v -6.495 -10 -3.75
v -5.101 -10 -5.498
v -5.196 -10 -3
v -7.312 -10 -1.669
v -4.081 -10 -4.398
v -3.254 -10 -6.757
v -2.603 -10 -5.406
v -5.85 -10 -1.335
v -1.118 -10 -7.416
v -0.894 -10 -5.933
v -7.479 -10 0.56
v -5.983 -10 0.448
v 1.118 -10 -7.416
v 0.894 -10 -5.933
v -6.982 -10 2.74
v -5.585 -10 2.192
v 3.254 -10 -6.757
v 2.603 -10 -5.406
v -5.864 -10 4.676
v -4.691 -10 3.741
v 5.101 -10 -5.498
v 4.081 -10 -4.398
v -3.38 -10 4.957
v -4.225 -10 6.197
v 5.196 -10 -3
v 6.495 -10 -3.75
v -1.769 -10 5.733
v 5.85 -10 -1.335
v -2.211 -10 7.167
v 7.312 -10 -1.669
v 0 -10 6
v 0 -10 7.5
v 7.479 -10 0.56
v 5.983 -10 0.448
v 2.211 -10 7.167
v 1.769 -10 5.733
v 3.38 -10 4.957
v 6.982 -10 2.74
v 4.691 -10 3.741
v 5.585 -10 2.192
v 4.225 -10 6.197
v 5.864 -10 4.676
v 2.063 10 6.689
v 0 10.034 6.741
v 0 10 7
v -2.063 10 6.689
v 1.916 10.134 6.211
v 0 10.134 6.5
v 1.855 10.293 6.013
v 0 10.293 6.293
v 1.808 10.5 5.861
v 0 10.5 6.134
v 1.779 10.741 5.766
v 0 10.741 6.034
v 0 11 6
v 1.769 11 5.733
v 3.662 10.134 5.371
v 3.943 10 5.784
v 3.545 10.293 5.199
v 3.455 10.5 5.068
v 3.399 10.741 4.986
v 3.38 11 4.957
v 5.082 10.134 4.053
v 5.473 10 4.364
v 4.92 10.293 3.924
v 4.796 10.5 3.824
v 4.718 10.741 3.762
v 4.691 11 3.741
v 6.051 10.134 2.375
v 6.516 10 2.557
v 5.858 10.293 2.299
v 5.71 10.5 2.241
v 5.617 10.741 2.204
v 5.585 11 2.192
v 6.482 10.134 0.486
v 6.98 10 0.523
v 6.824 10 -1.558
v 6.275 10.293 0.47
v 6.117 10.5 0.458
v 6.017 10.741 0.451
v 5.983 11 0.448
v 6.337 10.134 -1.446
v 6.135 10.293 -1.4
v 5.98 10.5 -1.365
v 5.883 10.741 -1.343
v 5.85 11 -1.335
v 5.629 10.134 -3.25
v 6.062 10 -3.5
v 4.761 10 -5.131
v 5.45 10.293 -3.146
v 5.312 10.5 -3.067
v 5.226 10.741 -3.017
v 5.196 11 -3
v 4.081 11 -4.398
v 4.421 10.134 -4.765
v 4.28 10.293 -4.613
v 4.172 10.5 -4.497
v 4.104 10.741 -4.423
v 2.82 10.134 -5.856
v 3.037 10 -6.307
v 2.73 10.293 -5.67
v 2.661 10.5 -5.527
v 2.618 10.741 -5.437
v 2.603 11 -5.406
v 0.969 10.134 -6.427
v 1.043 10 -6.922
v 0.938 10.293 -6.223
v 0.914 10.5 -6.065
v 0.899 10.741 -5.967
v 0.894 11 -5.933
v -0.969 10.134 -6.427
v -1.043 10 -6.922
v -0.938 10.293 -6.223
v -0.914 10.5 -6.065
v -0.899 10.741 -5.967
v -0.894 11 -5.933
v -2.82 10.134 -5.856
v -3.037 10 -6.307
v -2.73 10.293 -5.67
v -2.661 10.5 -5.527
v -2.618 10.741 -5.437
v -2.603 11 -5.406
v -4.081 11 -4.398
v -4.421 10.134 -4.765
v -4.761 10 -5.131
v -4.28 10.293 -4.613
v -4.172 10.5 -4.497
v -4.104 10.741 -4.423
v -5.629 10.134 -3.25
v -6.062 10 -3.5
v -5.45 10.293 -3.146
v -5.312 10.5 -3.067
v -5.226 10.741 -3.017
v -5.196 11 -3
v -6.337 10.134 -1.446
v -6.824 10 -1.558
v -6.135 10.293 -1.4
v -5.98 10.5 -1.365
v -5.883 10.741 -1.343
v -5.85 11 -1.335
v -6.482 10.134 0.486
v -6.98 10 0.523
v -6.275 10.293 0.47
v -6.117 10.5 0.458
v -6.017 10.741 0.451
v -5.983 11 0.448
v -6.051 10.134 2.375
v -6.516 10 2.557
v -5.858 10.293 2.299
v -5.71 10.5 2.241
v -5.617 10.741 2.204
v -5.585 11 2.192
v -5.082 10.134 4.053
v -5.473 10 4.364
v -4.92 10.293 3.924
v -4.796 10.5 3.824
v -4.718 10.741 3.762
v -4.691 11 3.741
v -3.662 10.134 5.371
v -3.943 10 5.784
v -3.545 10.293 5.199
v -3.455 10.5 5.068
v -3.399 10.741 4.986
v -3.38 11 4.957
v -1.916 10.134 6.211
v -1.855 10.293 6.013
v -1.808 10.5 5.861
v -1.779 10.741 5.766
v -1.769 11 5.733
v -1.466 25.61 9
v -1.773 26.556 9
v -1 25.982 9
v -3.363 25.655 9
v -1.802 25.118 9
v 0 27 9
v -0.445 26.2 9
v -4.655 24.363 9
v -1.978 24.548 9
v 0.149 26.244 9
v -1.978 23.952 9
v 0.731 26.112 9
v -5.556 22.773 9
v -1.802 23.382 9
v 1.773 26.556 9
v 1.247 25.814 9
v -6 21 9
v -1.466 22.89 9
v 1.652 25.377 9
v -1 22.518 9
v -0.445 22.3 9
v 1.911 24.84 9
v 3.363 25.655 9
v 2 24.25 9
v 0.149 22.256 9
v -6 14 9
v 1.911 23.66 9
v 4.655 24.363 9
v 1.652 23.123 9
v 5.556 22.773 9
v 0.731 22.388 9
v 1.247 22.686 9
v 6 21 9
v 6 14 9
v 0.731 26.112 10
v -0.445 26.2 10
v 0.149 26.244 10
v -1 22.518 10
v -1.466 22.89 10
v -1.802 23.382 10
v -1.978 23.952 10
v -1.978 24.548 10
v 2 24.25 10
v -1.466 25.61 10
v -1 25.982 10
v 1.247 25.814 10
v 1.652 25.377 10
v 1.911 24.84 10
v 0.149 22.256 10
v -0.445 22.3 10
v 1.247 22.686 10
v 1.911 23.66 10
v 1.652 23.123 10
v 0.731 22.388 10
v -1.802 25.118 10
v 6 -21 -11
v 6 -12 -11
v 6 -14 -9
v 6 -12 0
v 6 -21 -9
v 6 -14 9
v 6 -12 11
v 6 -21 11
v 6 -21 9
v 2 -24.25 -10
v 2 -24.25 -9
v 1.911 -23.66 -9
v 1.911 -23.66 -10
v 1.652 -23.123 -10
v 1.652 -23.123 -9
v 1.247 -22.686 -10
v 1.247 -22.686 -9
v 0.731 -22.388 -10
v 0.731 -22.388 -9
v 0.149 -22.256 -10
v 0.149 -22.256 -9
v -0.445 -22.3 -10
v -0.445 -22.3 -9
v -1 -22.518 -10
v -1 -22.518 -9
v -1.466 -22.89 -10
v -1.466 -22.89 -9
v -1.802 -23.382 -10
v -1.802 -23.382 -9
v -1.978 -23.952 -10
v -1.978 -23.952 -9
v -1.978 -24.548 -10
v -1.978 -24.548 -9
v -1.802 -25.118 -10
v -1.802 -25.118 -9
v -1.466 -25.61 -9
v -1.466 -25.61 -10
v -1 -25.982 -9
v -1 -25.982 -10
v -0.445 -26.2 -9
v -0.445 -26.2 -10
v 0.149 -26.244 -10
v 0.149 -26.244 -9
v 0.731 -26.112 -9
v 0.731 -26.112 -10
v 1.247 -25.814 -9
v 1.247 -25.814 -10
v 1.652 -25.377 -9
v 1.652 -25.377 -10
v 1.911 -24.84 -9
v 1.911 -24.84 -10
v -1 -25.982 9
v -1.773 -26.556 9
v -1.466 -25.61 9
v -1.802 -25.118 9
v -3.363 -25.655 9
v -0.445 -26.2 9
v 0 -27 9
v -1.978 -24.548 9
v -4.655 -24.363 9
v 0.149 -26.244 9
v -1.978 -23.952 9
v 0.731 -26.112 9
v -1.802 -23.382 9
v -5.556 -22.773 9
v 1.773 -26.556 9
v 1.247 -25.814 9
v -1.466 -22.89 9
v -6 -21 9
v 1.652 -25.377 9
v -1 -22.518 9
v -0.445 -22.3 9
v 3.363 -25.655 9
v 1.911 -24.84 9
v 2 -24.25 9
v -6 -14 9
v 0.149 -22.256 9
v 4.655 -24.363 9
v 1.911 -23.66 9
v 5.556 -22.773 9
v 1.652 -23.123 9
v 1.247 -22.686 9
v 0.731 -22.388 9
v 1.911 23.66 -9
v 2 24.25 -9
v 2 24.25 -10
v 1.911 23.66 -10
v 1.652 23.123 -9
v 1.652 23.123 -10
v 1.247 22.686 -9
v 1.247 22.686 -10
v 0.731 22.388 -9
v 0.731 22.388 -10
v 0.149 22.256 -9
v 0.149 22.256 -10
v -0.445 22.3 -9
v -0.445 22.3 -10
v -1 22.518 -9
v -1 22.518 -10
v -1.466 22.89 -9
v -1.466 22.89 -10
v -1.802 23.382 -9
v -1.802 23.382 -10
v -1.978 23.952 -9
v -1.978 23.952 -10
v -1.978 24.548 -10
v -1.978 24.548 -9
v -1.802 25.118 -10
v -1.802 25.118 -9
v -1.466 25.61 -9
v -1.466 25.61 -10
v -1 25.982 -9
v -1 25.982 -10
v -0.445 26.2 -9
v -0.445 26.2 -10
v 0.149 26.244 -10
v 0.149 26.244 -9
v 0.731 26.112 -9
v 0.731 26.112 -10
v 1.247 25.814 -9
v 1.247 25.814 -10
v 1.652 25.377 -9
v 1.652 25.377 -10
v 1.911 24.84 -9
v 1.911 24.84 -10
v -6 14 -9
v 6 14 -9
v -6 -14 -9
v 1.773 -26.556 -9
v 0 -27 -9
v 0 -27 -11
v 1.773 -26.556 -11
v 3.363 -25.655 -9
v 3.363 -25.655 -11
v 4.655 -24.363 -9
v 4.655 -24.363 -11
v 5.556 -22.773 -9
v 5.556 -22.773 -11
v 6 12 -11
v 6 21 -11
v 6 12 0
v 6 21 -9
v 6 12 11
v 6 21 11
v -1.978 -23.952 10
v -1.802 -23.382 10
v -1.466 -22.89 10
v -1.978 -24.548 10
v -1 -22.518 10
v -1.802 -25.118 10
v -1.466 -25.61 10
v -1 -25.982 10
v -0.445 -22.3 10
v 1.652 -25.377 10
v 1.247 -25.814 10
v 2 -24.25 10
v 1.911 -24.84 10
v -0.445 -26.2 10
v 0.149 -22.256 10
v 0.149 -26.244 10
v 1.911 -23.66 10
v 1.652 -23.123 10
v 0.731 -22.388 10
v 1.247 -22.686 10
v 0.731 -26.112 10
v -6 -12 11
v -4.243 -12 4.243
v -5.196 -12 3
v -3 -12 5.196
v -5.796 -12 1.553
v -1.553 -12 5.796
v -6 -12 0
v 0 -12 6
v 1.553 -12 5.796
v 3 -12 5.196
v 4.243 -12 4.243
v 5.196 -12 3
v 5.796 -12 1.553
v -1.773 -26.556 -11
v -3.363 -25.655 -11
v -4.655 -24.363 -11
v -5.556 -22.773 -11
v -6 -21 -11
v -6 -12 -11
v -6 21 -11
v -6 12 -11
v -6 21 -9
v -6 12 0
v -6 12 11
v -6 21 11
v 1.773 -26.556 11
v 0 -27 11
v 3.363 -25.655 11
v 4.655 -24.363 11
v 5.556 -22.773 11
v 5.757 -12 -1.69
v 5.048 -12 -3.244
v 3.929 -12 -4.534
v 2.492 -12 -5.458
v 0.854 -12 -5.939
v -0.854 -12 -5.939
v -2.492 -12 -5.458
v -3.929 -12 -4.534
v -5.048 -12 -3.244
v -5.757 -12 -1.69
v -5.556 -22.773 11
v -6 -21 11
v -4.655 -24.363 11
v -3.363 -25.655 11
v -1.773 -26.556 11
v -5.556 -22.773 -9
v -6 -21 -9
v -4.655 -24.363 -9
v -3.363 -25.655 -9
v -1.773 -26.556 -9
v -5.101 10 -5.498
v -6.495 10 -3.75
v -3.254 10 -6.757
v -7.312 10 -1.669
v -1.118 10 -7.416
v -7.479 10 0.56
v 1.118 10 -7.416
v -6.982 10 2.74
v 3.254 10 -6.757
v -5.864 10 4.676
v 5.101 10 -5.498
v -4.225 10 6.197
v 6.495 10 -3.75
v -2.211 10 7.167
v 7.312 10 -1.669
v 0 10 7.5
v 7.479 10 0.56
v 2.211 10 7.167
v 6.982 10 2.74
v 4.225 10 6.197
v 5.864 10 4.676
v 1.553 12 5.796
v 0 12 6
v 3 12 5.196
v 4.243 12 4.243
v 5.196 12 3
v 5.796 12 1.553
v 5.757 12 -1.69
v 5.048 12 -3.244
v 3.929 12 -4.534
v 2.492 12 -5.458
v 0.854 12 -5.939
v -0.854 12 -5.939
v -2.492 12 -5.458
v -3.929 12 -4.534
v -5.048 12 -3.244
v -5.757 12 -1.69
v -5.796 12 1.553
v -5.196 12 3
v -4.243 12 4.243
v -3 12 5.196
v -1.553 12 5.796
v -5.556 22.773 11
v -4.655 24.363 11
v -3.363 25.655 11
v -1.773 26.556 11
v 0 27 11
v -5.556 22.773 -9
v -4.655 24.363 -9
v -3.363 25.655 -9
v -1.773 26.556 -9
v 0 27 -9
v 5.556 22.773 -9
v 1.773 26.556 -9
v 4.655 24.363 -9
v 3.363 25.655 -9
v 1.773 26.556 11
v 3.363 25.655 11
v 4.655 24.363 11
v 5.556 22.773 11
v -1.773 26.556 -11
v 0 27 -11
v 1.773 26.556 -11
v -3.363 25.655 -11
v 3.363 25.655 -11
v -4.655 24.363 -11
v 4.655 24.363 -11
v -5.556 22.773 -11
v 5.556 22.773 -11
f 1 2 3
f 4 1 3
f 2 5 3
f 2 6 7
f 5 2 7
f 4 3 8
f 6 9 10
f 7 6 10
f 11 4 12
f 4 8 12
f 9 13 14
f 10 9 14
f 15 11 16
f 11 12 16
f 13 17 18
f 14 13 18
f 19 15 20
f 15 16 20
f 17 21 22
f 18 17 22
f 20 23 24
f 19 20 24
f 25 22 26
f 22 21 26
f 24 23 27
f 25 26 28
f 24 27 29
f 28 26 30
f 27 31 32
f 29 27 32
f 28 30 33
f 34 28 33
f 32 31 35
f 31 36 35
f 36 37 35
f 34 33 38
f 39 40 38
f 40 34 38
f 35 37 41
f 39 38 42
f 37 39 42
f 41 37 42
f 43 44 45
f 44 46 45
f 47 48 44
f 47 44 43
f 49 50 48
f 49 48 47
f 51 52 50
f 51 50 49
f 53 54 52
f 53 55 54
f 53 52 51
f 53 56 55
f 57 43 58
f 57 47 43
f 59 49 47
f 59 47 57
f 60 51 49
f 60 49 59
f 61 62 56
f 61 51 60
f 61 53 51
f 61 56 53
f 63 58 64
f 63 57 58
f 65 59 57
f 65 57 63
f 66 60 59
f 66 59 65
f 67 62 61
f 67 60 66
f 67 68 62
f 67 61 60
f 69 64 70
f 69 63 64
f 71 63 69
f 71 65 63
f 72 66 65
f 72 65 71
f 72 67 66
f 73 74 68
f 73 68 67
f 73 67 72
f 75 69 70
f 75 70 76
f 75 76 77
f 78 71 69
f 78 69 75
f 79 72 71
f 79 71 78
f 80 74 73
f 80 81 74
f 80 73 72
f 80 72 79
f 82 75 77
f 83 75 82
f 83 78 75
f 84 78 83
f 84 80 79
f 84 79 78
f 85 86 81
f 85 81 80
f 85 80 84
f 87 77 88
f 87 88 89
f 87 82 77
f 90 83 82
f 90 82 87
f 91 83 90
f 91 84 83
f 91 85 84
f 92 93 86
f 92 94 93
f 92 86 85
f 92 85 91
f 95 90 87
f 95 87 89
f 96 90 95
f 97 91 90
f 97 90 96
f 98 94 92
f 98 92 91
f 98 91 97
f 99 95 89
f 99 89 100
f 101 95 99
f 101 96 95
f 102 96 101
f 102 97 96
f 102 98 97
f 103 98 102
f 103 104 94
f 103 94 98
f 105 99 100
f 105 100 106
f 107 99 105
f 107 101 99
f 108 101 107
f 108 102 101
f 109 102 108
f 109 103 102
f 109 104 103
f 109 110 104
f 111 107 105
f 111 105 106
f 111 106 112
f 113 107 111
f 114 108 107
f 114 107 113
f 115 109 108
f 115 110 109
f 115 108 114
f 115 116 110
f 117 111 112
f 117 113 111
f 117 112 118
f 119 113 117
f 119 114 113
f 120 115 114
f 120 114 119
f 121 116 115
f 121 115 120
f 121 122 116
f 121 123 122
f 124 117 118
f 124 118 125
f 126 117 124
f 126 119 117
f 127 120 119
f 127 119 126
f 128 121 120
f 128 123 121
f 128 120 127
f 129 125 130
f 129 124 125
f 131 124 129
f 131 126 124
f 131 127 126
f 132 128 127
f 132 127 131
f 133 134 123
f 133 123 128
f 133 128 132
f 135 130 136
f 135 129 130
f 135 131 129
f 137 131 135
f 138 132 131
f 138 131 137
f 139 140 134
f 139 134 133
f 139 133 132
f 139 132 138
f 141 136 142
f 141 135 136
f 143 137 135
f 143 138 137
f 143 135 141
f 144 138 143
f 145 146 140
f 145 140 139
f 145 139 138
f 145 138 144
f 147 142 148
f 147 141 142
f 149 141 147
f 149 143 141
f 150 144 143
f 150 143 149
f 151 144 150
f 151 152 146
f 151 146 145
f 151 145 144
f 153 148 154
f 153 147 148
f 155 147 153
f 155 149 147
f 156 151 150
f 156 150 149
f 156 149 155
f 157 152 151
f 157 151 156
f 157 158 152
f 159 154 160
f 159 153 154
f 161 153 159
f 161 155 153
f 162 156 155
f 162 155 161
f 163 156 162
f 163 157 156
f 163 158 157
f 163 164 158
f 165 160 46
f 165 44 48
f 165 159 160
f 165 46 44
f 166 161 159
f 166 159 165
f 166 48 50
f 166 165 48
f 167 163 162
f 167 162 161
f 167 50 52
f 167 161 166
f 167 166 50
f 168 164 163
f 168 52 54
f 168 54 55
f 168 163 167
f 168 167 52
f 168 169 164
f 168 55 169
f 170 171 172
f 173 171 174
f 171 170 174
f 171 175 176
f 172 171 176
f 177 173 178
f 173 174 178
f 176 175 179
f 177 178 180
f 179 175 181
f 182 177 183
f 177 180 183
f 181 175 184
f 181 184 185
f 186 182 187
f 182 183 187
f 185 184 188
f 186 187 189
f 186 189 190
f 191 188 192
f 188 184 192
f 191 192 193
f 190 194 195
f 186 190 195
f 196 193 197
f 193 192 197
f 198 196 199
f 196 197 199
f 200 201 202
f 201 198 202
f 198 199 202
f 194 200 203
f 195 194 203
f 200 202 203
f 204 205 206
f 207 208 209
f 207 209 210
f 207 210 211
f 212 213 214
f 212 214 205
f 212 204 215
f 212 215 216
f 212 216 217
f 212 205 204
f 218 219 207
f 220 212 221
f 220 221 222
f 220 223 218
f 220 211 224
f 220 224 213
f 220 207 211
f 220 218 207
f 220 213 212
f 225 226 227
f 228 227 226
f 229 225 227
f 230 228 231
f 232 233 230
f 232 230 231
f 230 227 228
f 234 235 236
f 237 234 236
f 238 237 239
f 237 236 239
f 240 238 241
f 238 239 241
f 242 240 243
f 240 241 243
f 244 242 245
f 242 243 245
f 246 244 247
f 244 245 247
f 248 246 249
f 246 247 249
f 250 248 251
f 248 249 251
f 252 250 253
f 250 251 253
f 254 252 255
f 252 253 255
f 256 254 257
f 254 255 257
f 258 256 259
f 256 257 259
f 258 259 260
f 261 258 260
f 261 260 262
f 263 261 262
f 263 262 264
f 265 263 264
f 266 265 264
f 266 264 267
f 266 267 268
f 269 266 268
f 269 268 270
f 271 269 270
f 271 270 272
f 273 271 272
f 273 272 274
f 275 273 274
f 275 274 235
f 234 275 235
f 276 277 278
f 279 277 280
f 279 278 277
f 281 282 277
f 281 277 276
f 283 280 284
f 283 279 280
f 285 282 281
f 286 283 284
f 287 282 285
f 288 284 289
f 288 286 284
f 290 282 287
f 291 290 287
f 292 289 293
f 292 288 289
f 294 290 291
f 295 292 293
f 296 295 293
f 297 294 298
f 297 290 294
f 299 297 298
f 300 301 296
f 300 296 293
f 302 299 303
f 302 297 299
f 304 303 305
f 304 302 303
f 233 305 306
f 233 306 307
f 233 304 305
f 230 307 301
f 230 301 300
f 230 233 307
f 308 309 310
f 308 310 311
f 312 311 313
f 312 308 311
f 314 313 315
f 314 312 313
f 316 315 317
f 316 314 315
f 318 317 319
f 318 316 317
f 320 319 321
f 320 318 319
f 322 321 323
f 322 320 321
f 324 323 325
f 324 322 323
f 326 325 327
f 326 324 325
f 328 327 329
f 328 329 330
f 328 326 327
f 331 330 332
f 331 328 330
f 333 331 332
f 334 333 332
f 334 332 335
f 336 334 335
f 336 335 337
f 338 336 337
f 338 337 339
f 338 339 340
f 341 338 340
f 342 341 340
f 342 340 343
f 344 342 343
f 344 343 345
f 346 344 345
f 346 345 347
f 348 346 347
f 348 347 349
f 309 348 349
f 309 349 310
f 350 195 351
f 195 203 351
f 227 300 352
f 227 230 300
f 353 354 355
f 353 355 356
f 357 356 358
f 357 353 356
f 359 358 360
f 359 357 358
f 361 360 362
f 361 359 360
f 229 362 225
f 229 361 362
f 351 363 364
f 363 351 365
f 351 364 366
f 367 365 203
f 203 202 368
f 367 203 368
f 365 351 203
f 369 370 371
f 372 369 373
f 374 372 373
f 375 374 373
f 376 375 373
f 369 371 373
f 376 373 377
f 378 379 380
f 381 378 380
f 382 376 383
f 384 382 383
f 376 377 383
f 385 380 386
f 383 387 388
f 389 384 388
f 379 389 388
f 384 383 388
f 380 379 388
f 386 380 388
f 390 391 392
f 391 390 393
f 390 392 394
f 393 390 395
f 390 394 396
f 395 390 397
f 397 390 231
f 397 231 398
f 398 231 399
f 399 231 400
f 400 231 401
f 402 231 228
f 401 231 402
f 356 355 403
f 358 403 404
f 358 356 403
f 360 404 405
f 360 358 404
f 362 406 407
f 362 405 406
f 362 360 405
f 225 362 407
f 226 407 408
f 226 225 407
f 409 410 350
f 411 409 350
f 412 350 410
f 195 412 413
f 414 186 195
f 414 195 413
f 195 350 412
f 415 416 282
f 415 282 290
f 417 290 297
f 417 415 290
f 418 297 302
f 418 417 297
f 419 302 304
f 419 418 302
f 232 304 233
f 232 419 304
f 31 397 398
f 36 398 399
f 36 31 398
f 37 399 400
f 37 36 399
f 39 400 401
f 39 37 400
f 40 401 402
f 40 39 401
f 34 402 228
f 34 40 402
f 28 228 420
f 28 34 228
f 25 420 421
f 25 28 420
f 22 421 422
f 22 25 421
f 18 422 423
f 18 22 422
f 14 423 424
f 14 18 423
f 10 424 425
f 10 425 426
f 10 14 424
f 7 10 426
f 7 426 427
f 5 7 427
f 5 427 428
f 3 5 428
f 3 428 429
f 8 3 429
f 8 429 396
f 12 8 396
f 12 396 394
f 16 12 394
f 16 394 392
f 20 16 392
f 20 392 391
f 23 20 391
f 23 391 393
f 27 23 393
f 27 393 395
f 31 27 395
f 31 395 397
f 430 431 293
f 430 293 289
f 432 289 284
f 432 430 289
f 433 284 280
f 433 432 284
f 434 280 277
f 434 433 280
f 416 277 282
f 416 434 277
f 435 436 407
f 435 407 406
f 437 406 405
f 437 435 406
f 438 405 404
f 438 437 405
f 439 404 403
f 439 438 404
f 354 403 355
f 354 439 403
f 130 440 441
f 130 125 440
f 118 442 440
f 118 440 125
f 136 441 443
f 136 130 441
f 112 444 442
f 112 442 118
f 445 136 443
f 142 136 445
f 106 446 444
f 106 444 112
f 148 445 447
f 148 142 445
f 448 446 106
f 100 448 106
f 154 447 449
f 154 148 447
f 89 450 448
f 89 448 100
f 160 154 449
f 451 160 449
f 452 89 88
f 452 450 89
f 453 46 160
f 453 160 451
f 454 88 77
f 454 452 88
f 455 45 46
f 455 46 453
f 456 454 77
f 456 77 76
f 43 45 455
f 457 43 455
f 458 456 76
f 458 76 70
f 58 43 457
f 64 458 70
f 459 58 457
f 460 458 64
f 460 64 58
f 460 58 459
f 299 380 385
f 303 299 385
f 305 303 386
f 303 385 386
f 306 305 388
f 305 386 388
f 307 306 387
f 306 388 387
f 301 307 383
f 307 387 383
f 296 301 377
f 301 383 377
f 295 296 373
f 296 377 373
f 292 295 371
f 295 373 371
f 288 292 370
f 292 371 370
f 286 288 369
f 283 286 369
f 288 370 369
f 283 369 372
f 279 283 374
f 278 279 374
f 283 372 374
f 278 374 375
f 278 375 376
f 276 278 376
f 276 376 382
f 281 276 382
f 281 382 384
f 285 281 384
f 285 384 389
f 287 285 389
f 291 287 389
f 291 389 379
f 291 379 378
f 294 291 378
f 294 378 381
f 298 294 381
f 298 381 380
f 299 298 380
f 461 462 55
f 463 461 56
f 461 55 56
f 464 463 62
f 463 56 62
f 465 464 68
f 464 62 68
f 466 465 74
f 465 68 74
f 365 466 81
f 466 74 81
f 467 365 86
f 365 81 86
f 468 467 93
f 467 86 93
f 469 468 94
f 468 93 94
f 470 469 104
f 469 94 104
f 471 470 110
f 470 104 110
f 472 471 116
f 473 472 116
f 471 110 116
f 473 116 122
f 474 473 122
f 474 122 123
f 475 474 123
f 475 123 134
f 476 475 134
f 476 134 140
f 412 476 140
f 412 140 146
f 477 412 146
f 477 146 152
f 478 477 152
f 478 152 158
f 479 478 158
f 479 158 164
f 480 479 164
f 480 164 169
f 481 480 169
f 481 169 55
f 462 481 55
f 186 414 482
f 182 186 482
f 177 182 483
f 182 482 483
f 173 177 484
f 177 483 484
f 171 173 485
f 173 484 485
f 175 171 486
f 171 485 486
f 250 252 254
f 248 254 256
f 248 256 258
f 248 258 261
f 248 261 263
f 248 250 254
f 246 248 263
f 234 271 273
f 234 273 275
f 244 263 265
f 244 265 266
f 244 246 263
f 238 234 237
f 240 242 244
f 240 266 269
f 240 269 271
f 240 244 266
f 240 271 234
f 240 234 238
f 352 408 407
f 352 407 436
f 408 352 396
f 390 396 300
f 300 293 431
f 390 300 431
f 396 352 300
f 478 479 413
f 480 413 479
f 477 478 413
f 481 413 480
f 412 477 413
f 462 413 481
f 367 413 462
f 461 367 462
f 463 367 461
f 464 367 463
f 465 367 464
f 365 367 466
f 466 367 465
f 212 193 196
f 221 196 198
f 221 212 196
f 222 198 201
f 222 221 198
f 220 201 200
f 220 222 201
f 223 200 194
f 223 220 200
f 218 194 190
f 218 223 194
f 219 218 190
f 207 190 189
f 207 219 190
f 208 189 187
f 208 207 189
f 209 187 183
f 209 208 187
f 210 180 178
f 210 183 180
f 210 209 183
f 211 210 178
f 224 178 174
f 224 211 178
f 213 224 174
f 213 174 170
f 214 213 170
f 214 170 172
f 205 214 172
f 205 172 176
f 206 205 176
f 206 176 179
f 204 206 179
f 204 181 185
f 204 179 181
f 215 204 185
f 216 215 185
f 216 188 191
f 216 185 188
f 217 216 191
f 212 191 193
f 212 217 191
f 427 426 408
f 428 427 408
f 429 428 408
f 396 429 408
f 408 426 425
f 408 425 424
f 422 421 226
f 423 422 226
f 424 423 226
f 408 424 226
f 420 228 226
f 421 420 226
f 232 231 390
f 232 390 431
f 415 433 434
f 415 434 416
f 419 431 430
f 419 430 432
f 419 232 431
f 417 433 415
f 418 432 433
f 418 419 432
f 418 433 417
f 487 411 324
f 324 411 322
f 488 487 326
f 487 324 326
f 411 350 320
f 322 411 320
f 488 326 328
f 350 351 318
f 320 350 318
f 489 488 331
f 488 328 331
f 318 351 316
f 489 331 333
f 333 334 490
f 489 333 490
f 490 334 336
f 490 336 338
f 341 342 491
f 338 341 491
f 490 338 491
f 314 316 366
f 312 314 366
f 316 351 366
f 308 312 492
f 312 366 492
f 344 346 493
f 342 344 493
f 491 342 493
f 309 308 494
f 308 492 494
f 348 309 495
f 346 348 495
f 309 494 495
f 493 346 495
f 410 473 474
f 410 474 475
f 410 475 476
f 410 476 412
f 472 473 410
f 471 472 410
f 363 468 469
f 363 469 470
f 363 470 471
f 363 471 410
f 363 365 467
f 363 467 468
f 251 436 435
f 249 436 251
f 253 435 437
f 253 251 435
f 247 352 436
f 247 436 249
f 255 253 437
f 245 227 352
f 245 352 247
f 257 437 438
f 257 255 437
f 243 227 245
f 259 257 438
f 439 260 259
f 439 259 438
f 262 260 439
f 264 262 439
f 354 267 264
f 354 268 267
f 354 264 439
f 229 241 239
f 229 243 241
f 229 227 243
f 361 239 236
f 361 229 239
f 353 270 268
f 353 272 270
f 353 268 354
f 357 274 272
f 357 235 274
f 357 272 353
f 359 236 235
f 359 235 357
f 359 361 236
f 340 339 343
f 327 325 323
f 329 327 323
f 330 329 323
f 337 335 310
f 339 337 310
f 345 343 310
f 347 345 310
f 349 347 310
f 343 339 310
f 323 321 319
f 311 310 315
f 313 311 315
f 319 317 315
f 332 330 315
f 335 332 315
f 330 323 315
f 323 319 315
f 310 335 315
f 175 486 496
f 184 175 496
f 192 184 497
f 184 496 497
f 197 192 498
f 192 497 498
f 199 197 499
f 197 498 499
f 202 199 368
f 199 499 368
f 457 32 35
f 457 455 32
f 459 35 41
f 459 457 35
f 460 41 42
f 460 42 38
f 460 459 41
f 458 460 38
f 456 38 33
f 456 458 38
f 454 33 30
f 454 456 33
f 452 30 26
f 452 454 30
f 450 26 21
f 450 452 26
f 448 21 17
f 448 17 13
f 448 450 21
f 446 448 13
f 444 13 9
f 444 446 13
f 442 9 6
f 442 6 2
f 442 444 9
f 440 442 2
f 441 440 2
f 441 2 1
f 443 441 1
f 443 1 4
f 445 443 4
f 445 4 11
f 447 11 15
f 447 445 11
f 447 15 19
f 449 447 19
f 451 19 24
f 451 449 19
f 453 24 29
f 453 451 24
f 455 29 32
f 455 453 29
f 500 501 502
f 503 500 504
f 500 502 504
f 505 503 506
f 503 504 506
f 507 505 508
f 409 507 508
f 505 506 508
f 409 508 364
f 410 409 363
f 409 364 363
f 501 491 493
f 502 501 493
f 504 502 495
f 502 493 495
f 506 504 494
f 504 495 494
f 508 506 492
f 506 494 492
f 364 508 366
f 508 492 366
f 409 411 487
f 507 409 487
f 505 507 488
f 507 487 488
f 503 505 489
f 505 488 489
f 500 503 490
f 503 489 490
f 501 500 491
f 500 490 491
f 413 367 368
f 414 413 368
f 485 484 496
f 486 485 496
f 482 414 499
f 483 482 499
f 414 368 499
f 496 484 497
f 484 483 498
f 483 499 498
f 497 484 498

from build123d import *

# Parameters (mm, degrees)
SKETCH1_R           = 7.5
BOSS_EXTRUDE1_DEPTH = 10
SKETCH5_R           = 6
BOSS_EXTRUDE2_DEPTH = 2
FILLET2_R           = 1
BOSS_EXTRUDE3_DEPTH = 6
CUT_EXTRUDE4_DEPTH  = 29
CUT_EXTRUDE5_START  = -1
SKETCH10_R          = 2
CUT_EXTRUDE5_DEPTH  = 20


with BuildPart() as part:
    # Sketch1 → Boss-Extrude1 (new body)
    with BuildSketch(Plane(origin=(0, 0, 0), x_dir=(1, 0, 0), z_dir=(0, 1, 0))):
        Circle(SKETCH1_R)
    boss_extrude1 = extrude(amount=BOSS_EXTRUDE1_DEPTH)

    # Sketch5 → Boss-Extrude2 (add)
    with BuildSketch(Plane(origin=(0, 10, 0), x_dir=(1, 0, 0), z_dir=(0, 1, 0))):
        Circle(SKETCH5_R)
    boss_extrude2 = extrude(amount=BOSS_EXTRUDE2_DEPTH)

    # Fillet2
    fillet2_edges = [part.edges().sort_by_distance(p)[0] for p in [
        (-6, 10, 0),
    ]]
    fillet(fillet2_edges, radius=FILLET2_R)

    # Sketch6 → Boss-Extrude3 (add, symmetric)
    with BuildSketch(Plane(origin=(0, 0, 0), x_dir=(0, 0, -1), z_dir=(1, 0, 0))):
        Polygon((6, 12), (-6, 12), (-11, 12), (-11, 27), (-9, 27), (-9, 14), (9, 14), (9, 27), (11, 27), (11, 12), align=None)
    boss_extrude3 = extrude(amount=BOSS_EXTRUDE3_DEPTH, both=True)

    # Sketch9 → Cut-Extrude4 (cut)
    with BuildSketch(Plane.XY.offset(11)):
        with BuildLine():
            Line((-6, 27), (-6, 21))
            ThreePointArc((-6, 21), (-4.052343178, 25.052343178), (0, 27))
            Line((0, 27), (-6, 27))
        make_face()
        with BuildLine():
            ThreePointArc((0, 27), (4.052343178, 25.052343178), (6, 21))
            Line((6, 21), (6, 27))
            Line((6, 27), (0, 27))
        make_face()
    cut_extrude4 = extrude(amount=-CUT_EXTRUDE4_DEPTH, mode=Mode.SUBTRACT)

    # Sketch10 → Cut-Extrude5 (cut)
    with BuildSketch(Plane(origin=(0, 0, 9), x_dir=(-1, 0, 0), z_dir=(0, 0, -1)).offset(CUT_EXTRUDE5_START)):
        with Locations((0, 24.25)):
            Circle(SKETCH10_R)
    cut_extrude5 = extrude(amount=CUT_EXTRUDE5_DEPTH, mode=Mode.SUBTRACT)

    # Mirror2: Boss-Extrude1 across plane
    add(boss_extrude1.mirror(Plane.ZX))

    # Mirror9: Boss-Extrude2, Boss-Extrude3 across plane
    add(boss_extrude2.mirror(Plane.ZX))
    add(boss_extrude3.mirror(Plane.ZX))

    # Mirror11: Cut-Extrude4, Cut-Extrude5 across plane
    add(cut_extrude4.mirror(Plane.ZX), mode=Mode.SUBTRACT)
    add(cut_extrude5.mirror(Plane.ZX), mode=Mode.SUBTRACT)


solid = part.part
